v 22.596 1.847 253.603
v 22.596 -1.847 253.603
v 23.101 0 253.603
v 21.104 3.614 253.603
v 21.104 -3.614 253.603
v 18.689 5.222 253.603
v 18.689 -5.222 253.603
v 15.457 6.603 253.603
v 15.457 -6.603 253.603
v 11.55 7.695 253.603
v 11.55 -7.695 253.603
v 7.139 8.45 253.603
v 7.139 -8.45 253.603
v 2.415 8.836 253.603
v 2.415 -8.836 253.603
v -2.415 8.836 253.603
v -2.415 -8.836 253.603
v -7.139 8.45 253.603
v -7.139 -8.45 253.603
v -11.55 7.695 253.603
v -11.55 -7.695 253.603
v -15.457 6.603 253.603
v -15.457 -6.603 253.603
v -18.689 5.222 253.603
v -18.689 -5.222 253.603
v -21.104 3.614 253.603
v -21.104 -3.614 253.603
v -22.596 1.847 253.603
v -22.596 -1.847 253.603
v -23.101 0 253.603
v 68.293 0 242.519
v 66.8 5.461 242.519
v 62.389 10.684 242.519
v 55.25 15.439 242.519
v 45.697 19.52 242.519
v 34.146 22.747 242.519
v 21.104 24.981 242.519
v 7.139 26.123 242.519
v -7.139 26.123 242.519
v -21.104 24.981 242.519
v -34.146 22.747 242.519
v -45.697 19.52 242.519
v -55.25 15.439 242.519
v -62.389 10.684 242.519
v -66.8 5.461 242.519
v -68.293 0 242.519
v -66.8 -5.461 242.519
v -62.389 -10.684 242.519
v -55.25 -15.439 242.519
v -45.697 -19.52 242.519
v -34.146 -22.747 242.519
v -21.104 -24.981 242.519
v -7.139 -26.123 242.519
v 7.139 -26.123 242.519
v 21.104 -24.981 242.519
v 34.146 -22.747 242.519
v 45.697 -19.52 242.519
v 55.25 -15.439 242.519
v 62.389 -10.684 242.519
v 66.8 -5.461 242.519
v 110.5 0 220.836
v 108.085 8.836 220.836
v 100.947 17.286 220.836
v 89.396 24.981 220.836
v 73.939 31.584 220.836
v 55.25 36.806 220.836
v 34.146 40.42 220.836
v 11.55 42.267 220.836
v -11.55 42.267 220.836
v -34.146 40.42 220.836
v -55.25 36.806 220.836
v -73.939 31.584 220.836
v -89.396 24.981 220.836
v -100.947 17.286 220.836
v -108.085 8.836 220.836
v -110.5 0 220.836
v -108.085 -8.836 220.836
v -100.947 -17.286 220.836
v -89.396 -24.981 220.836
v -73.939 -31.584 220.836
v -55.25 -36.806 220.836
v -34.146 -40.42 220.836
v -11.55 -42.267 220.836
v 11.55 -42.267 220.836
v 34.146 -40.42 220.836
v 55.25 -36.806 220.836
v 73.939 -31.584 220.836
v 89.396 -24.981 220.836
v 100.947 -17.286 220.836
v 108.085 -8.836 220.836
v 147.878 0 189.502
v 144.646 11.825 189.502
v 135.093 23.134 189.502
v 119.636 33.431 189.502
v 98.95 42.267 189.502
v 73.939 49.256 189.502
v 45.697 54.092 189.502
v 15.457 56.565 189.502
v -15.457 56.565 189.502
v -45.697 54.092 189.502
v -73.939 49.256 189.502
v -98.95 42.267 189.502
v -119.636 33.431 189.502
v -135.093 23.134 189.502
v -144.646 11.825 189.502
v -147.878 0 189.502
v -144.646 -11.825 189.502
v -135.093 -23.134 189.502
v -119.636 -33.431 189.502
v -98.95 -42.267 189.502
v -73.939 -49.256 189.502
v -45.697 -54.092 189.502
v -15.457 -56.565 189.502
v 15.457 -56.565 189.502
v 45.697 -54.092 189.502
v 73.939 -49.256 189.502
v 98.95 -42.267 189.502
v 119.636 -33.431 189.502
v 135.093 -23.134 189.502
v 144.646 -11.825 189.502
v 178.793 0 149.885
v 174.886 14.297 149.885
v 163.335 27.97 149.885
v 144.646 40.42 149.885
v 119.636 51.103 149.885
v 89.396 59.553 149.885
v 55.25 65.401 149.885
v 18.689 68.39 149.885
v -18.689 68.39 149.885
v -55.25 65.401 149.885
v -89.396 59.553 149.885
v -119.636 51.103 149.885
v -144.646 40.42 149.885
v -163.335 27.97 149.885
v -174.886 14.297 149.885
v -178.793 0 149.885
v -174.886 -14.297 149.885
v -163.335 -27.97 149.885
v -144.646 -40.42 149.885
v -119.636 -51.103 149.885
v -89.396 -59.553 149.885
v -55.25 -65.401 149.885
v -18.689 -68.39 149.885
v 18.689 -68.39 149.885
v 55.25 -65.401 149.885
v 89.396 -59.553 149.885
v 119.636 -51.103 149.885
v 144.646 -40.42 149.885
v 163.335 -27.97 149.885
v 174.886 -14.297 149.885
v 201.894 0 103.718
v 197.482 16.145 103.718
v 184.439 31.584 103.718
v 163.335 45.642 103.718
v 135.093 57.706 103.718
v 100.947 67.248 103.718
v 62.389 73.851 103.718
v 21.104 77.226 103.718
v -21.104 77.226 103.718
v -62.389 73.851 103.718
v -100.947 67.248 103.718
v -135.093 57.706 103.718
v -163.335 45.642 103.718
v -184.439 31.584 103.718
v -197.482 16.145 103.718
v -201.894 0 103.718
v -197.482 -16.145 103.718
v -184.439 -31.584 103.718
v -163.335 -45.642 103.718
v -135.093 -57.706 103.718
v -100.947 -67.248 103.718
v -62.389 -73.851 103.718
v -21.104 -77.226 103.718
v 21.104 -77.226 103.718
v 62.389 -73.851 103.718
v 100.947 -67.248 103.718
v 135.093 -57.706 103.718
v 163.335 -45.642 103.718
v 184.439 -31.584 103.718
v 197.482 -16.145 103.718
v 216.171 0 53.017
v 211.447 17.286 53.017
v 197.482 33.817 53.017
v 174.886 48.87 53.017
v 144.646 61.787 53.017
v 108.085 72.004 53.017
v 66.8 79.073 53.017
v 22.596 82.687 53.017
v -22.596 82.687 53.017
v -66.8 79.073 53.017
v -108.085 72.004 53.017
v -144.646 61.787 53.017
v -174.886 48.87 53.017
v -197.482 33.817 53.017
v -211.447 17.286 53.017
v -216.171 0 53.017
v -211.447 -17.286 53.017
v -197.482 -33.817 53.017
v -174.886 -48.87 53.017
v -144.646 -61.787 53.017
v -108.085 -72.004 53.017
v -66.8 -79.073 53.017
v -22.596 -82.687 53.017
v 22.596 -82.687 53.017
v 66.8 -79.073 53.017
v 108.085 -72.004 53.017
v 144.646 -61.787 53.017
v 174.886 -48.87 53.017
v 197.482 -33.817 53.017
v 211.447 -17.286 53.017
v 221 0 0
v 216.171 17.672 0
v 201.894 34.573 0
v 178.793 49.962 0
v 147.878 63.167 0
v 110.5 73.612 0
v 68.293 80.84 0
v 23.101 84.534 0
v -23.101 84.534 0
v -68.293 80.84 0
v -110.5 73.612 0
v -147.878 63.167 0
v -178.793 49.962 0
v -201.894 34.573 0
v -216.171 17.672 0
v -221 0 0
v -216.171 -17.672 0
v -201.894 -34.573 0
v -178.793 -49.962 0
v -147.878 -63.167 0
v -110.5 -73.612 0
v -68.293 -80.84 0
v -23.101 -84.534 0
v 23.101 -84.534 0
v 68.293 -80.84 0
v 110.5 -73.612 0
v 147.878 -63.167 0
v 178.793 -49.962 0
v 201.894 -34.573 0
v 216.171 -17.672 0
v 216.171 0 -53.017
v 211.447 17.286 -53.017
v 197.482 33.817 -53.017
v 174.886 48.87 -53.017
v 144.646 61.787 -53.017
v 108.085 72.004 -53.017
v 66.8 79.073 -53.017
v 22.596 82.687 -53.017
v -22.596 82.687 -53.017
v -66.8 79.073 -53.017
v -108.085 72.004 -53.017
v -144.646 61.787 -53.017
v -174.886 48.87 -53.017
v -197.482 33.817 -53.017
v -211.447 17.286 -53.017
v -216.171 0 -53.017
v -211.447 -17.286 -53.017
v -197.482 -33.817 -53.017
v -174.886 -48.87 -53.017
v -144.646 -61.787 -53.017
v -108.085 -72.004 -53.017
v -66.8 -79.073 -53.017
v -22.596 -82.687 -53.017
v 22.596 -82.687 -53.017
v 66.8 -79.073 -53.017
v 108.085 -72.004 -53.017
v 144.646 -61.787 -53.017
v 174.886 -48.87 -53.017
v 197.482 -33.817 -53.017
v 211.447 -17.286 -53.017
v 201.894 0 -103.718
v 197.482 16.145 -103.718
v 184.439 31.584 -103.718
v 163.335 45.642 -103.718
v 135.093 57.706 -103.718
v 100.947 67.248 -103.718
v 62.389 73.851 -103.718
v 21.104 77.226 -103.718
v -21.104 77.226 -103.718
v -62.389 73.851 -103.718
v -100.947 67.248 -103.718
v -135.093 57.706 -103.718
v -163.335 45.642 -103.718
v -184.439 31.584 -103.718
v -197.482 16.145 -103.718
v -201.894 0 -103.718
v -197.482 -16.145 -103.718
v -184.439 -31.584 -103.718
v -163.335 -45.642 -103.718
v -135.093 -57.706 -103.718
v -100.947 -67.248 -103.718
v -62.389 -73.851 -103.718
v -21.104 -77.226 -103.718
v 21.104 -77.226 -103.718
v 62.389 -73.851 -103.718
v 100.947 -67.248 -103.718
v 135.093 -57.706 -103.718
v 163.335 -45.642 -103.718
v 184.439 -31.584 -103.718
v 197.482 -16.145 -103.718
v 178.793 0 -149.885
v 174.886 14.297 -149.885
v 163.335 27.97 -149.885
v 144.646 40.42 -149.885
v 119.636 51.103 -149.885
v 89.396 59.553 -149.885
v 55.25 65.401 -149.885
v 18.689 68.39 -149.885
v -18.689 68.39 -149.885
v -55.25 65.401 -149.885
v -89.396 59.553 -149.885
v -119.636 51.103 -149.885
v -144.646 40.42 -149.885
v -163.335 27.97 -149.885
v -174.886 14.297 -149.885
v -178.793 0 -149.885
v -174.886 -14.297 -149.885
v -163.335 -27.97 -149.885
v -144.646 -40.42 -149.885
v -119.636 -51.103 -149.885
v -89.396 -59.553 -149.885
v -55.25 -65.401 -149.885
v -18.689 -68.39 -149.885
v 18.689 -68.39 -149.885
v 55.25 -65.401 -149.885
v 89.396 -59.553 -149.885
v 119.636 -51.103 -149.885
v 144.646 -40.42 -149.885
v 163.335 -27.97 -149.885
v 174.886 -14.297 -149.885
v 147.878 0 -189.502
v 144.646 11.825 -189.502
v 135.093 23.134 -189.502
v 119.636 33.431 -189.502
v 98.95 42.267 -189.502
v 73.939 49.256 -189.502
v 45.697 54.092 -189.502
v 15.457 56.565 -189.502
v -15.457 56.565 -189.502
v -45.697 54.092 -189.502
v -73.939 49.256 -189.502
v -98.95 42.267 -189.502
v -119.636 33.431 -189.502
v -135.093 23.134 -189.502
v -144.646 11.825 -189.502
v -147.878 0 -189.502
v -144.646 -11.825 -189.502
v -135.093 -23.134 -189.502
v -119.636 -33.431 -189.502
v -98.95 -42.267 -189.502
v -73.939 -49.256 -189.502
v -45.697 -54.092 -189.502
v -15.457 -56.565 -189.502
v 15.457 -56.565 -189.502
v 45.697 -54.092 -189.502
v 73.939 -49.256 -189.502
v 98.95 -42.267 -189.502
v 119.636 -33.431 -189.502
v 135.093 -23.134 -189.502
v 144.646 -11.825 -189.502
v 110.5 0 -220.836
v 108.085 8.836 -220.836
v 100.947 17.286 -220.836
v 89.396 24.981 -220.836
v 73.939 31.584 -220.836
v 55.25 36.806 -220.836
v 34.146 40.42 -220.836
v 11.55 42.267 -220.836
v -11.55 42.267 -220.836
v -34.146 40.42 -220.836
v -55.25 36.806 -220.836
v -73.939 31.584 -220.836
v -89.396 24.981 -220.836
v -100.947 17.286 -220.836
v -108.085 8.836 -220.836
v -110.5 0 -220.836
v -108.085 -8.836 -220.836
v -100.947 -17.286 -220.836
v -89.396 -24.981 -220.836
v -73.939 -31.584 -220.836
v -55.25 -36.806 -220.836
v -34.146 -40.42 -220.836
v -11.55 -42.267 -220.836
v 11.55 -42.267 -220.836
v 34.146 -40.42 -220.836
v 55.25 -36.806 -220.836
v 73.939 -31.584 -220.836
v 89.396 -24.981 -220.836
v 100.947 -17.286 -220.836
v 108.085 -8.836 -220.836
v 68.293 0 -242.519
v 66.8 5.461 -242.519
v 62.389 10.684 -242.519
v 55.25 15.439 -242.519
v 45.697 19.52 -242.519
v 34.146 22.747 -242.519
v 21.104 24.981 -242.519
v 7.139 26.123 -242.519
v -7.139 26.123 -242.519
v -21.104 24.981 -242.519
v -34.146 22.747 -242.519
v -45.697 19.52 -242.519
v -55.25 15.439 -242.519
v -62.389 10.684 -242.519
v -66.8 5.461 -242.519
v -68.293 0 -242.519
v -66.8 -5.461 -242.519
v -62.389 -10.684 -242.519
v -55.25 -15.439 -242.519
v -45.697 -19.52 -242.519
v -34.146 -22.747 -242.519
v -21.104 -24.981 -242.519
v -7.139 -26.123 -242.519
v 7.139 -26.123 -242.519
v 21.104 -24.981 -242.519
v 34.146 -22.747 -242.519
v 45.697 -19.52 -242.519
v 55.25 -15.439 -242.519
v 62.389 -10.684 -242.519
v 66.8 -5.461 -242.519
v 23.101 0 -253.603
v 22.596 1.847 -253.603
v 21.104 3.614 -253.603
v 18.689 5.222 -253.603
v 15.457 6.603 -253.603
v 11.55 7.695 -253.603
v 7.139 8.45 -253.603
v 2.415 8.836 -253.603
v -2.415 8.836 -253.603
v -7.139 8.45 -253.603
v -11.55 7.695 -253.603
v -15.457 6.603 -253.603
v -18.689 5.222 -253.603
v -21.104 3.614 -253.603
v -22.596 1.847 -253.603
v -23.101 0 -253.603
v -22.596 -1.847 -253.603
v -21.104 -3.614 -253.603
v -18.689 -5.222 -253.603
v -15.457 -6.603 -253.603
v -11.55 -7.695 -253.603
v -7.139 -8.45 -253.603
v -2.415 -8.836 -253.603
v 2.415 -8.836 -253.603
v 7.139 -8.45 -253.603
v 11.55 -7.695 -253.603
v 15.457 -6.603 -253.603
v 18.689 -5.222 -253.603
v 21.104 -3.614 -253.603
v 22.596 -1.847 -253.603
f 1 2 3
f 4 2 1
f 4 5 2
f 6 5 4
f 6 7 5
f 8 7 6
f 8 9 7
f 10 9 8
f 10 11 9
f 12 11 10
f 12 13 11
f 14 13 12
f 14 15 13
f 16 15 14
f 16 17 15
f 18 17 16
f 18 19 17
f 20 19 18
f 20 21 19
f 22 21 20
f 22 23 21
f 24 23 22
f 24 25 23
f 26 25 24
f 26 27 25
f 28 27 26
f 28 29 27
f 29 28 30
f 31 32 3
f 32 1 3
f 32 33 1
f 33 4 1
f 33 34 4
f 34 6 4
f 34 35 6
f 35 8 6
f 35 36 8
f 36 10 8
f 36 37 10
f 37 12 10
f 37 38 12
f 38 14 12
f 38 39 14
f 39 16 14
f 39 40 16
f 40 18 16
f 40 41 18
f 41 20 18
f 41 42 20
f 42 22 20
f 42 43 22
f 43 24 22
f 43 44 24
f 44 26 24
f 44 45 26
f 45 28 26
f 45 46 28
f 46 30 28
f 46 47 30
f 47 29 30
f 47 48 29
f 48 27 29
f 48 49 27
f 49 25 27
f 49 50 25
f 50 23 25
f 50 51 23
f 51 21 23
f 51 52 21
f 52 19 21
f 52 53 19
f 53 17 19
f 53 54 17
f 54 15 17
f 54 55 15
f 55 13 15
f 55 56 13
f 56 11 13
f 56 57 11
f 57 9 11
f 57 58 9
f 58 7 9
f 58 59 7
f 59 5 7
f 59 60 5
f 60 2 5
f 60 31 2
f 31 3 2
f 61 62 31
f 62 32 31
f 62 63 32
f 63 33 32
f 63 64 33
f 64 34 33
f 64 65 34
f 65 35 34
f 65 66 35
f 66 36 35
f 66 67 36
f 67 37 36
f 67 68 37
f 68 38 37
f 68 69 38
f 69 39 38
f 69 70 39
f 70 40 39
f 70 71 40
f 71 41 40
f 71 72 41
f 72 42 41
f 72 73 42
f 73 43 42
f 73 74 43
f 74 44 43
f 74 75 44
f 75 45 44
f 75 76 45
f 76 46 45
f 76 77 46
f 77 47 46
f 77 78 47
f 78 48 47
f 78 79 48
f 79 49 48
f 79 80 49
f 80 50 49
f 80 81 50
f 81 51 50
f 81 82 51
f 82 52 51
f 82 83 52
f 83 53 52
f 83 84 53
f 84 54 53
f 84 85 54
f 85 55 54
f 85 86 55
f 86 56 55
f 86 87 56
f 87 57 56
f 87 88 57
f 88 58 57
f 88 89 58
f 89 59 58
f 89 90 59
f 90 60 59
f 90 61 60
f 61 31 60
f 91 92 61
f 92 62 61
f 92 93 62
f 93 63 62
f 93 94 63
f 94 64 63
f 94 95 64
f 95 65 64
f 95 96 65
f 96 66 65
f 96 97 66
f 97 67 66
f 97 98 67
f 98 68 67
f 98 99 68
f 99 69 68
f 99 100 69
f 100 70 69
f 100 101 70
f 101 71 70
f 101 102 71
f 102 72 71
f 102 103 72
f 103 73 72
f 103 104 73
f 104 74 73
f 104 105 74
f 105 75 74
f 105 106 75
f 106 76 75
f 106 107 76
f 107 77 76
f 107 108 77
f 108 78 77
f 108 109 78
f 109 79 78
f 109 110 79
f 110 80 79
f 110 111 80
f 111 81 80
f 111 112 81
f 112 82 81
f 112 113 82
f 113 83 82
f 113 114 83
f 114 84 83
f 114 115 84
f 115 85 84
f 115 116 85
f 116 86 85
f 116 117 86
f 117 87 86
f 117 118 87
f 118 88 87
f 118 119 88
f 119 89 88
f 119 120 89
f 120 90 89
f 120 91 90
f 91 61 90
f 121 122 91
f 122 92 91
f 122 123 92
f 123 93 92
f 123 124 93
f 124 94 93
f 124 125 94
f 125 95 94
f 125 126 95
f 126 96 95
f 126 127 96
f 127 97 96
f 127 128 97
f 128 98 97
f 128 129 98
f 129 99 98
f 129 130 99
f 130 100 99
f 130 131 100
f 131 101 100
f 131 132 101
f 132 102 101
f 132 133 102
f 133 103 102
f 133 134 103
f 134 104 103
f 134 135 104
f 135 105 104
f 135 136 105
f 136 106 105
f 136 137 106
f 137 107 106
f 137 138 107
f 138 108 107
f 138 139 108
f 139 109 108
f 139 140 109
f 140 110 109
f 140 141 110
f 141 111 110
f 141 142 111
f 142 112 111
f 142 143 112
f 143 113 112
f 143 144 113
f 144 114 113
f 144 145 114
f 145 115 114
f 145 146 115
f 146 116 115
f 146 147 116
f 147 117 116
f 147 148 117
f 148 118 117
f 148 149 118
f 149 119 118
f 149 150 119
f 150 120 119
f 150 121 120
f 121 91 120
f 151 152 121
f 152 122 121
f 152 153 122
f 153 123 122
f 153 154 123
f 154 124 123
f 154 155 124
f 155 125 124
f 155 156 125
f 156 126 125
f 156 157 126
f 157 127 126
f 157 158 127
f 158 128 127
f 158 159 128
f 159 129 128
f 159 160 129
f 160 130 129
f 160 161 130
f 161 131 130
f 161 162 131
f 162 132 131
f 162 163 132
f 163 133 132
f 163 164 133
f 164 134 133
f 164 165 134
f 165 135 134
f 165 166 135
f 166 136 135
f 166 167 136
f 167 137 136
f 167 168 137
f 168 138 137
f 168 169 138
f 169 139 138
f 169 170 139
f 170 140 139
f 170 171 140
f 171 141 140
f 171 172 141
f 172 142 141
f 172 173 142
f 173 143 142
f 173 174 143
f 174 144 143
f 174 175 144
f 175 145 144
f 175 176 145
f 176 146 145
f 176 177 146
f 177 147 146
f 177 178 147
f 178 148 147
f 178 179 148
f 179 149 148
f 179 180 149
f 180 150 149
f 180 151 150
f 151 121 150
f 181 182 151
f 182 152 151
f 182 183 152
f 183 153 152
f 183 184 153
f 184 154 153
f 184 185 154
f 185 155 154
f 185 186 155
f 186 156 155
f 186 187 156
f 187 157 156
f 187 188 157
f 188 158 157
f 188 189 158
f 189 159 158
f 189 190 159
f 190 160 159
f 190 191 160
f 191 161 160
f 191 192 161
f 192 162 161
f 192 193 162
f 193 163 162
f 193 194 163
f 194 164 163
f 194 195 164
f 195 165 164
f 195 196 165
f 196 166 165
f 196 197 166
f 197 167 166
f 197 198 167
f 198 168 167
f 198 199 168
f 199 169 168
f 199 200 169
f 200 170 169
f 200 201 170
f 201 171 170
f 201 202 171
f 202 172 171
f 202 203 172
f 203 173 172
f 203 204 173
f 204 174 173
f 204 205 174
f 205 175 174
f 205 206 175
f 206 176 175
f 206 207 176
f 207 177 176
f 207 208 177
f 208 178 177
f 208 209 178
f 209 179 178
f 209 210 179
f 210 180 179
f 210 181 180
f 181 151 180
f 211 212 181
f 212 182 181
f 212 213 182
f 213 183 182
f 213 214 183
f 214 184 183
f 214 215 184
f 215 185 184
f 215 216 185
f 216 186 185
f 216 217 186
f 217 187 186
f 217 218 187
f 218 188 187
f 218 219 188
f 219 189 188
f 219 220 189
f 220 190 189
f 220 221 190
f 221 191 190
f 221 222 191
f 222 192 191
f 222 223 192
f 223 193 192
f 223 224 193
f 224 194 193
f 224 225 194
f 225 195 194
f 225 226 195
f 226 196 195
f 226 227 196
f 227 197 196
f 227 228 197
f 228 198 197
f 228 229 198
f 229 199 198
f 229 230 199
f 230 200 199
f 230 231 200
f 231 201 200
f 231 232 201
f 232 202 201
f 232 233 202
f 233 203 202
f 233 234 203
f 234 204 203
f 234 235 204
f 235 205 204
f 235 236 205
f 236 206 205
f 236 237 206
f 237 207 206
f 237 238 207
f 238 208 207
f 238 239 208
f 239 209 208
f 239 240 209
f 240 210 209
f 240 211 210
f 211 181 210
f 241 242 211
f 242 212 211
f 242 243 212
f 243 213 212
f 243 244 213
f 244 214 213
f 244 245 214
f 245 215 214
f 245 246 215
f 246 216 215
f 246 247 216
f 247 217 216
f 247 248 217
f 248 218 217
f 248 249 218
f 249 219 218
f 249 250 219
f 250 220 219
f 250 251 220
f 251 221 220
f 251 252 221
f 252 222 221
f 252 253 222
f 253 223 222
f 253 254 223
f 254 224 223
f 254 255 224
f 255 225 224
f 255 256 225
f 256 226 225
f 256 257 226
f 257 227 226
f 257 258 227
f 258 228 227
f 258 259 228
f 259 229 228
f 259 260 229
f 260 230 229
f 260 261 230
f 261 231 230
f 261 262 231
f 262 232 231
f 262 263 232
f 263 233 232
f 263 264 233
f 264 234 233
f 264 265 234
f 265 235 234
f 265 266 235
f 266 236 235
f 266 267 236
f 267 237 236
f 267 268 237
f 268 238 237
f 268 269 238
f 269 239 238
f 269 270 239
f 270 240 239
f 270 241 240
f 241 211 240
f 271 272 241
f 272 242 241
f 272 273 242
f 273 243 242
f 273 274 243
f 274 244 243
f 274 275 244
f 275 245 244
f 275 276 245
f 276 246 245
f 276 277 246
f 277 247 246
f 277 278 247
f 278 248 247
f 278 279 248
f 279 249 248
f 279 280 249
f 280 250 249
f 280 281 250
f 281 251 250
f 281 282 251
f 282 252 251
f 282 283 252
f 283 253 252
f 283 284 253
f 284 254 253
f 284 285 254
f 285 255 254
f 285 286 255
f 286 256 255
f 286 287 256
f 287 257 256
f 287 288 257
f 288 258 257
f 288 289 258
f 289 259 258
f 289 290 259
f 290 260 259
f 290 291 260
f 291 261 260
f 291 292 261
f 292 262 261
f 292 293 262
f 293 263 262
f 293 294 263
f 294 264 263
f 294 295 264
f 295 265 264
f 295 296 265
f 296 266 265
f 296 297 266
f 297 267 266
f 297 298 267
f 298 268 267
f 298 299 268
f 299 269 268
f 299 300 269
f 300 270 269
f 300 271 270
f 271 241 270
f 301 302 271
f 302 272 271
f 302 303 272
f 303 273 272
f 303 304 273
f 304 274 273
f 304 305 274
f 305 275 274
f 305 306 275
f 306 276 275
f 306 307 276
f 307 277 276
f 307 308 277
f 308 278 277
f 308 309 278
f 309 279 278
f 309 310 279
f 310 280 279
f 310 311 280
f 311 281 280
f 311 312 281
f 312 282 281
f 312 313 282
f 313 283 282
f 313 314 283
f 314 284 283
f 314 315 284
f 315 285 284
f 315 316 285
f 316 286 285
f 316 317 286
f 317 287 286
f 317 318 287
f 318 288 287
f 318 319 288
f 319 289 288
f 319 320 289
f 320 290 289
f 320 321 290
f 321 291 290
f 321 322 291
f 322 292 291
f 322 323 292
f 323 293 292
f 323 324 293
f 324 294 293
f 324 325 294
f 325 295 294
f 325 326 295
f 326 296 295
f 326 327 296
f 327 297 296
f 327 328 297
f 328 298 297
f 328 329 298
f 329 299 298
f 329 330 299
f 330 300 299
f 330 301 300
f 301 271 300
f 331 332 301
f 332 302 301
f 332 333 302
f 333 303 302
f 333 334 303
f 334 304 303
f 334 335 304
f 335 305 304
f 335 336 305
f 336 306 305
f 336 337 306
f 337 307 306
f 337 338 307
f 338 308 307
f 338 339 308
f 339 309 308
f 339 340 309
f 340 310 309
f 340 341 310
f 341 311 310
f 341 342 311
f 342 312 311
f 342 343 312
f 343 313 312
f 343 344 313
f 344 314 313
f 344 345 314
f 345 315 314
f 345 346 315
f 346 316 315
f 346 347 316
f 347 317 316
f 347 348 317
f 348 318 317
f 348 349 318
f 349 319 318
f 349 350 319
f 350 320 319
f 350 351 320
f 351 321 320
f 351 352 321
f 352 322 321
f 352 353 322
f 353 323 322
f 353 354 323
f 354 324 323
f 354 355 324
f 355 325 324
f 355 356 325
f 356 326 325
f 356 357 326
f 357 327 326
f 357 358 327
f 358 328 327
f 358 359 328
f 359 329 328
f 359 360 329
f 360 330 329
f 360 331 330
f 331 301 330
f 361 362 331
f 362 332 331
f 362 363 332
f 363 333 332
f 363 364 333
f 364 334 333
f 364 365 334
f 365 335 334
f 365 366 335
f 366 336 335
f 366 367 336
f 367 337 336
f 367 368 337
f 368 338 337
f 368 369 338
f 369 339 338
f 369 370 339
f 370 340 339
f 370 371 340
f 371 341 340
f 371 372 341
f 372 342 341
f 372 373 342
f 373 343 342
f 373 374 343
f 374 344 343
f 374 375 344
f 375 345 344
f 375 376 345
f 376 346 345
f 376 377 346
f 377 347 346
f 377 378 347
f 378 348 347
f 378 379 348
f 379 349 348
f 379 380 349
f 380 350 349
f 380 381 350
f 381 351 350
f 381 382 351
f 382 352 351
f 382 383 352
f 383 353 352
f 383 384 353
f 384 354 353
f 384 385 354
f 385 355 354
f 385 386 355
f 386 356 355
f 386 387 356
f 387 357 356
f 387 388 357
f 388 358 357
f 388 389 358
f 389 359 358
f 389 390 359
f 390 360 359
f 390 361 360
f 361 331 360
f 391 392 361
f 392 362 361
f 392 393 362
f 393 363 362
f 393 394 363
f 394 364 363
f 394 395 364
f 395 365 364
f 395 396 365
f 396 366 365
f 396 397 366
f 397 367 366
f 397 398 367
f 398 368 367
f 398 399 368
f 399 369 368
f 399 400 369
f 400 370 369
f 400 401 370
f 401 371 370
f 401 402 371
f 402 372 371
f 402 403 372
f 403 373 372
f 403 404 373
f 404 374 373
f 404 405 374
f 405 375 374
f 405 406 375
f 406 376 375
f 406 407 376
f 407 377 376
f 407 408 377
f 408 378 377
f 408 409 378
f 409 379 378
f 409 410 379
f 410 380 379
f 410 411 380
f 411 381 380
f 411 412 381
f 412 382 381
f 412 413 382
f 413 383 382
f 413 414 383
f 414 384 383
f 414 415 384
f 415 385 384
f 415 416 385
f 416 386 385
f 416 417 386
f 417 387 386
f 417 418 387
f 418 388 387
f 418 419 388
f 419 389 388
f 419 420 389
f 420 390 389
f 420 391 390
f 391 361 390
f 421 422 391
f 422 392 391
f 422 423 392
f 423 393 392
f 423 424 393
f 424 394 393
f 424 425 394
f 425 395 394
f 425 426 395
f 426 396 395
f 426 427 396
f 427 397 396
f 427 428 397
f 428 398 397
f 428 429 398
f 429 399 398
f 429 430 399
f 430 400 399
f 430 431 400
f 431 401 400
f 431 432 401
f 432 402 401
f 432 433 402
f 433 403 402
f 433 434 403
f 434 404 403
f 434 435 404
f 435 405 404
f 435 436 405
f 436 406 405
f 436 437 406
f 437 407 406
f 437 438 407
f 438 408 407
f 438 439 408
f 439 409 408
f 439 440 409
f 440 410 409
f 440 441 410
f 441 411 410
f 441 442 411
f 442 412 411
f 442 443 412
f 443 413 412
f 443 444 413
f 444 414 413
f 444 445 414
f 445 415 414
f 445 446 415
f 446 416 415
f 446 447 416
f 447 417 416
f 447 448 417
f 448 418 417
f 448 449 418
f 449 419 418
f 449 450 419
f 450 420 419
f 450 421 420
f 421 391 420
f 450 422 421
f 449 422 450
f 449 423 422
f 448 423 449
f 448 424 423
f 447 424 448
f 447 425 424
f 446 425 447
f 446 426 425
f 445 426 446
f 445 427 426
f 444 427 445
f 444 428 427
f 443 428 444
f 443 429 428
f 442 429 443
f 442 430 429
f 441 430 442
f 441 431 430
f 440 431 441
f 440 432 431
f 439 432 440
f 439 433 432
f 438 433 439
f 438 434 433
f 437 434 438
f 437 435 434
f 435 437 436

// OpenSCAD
// Generated by SolidPython 1.0.1 on 2020-07-29 00:46:50


scale(v = [13, 5, 15]) {
	sphere(r = 17);
}
/***********************************************
*********      SolidPython code:      **********
************************************************
 
# import packages: SolidPython
from solid import *
from solid.utils import *
from itertools import chain, combinations, permutations


class Resize:

    def __init__(self, scad_file):
        self.scad_file = scad_file
        #self.scad_file = import_scad(scad_file)
        # cone/cylinder param:
        self.r1 = 0
        self.r2 = 0
        self.h = 0
        # rectangular prism param:
        self.w = 0
        self.l = 0
        # ellipse param:
        self.r = 0

    # import OpenScad code (file name corresponds to shape)


    # classify shape + parameters
    def assign(self, param1, param2, param3):
        if self.scad_file == 'cone.scad':
            self.r1 = param1
            self.r2 = param2
            self.h = param3
        elif self.scad_file == 'cylinder.scad':
            self.r1 = param1
            self.r2 = param2
            self.h = param3
        elif self.scad_file == 'rectangularPrism.scad':
            self.h = param1
            self.l = param2
            self.w = param3
        else:
            self.r = param1
            self.h = param2

    # resize parameters
    def iterate(self):
        x = range(3, 20, 2)
        i = 1
        if self.scad_file == 'cone.scad':
            tempList = list(permutations(x, 2))
            for temp in tempList:
                param1 = temp[0]
                param2 = temp[1]
                filepath = 'produced_scad_files/' + 'cone' + str(param1) + '_' + str(param2) + '_' + '.scad'
                scad_render_to_file(cylinder(h=param1, r1=param2, r2=0), filepath)

        elif self.scad_file == 'cylinder.scad':
            tempList = list(permutations(x, 3))
            for temp in tempList:
                param1 = temp[0]
                param2 = temp[1]
                filepath = 'produced_scad_files/' + 'cylinder' + str(param1) + '_' + str(param2) + '_' + '.scad'
                scad_render_to_file(cylinder(h=param1, r1=param2, r2=param2), filepath)

        elif self.scad_file == 'rectangularPrism.scad':
            tempList = list(permutations(x, 3))
            for temp in tempList:
                param1 = temp[0]
                param2 = temp[1]
                param3 = temp[2]
                filepath = 'produced_scad_files/' + 'rectangularPrism' + str(param1) + '_' + str(param2) + '_' + str(
                    param3) + '.scad'
                scad_render_to_file(cube(size=(param1, param2, param3)), filepath)

        elif self.scad_file == 'ellipse.scad':
            tempList = list(permutations(x, 4))
            for temp in tempList:
                param1 = temp[0]
                param2 = temp[1]
                param3 = temp[2]
                param4 = temp[3]
                filepath = 'produced_scad_files/' + 'ellipse' + str(param1) + '_' + str(param2) + '_' + str(param3) + '_' + str(param4) + '.scad'
                scad_render_to_file(scale([param1, param2, param3])(sphere(r=param4)), filepath)

    def render_to_scadfile(self):
        scad_render_to_file(scad, 'example.scad') 
 
************************************************/
